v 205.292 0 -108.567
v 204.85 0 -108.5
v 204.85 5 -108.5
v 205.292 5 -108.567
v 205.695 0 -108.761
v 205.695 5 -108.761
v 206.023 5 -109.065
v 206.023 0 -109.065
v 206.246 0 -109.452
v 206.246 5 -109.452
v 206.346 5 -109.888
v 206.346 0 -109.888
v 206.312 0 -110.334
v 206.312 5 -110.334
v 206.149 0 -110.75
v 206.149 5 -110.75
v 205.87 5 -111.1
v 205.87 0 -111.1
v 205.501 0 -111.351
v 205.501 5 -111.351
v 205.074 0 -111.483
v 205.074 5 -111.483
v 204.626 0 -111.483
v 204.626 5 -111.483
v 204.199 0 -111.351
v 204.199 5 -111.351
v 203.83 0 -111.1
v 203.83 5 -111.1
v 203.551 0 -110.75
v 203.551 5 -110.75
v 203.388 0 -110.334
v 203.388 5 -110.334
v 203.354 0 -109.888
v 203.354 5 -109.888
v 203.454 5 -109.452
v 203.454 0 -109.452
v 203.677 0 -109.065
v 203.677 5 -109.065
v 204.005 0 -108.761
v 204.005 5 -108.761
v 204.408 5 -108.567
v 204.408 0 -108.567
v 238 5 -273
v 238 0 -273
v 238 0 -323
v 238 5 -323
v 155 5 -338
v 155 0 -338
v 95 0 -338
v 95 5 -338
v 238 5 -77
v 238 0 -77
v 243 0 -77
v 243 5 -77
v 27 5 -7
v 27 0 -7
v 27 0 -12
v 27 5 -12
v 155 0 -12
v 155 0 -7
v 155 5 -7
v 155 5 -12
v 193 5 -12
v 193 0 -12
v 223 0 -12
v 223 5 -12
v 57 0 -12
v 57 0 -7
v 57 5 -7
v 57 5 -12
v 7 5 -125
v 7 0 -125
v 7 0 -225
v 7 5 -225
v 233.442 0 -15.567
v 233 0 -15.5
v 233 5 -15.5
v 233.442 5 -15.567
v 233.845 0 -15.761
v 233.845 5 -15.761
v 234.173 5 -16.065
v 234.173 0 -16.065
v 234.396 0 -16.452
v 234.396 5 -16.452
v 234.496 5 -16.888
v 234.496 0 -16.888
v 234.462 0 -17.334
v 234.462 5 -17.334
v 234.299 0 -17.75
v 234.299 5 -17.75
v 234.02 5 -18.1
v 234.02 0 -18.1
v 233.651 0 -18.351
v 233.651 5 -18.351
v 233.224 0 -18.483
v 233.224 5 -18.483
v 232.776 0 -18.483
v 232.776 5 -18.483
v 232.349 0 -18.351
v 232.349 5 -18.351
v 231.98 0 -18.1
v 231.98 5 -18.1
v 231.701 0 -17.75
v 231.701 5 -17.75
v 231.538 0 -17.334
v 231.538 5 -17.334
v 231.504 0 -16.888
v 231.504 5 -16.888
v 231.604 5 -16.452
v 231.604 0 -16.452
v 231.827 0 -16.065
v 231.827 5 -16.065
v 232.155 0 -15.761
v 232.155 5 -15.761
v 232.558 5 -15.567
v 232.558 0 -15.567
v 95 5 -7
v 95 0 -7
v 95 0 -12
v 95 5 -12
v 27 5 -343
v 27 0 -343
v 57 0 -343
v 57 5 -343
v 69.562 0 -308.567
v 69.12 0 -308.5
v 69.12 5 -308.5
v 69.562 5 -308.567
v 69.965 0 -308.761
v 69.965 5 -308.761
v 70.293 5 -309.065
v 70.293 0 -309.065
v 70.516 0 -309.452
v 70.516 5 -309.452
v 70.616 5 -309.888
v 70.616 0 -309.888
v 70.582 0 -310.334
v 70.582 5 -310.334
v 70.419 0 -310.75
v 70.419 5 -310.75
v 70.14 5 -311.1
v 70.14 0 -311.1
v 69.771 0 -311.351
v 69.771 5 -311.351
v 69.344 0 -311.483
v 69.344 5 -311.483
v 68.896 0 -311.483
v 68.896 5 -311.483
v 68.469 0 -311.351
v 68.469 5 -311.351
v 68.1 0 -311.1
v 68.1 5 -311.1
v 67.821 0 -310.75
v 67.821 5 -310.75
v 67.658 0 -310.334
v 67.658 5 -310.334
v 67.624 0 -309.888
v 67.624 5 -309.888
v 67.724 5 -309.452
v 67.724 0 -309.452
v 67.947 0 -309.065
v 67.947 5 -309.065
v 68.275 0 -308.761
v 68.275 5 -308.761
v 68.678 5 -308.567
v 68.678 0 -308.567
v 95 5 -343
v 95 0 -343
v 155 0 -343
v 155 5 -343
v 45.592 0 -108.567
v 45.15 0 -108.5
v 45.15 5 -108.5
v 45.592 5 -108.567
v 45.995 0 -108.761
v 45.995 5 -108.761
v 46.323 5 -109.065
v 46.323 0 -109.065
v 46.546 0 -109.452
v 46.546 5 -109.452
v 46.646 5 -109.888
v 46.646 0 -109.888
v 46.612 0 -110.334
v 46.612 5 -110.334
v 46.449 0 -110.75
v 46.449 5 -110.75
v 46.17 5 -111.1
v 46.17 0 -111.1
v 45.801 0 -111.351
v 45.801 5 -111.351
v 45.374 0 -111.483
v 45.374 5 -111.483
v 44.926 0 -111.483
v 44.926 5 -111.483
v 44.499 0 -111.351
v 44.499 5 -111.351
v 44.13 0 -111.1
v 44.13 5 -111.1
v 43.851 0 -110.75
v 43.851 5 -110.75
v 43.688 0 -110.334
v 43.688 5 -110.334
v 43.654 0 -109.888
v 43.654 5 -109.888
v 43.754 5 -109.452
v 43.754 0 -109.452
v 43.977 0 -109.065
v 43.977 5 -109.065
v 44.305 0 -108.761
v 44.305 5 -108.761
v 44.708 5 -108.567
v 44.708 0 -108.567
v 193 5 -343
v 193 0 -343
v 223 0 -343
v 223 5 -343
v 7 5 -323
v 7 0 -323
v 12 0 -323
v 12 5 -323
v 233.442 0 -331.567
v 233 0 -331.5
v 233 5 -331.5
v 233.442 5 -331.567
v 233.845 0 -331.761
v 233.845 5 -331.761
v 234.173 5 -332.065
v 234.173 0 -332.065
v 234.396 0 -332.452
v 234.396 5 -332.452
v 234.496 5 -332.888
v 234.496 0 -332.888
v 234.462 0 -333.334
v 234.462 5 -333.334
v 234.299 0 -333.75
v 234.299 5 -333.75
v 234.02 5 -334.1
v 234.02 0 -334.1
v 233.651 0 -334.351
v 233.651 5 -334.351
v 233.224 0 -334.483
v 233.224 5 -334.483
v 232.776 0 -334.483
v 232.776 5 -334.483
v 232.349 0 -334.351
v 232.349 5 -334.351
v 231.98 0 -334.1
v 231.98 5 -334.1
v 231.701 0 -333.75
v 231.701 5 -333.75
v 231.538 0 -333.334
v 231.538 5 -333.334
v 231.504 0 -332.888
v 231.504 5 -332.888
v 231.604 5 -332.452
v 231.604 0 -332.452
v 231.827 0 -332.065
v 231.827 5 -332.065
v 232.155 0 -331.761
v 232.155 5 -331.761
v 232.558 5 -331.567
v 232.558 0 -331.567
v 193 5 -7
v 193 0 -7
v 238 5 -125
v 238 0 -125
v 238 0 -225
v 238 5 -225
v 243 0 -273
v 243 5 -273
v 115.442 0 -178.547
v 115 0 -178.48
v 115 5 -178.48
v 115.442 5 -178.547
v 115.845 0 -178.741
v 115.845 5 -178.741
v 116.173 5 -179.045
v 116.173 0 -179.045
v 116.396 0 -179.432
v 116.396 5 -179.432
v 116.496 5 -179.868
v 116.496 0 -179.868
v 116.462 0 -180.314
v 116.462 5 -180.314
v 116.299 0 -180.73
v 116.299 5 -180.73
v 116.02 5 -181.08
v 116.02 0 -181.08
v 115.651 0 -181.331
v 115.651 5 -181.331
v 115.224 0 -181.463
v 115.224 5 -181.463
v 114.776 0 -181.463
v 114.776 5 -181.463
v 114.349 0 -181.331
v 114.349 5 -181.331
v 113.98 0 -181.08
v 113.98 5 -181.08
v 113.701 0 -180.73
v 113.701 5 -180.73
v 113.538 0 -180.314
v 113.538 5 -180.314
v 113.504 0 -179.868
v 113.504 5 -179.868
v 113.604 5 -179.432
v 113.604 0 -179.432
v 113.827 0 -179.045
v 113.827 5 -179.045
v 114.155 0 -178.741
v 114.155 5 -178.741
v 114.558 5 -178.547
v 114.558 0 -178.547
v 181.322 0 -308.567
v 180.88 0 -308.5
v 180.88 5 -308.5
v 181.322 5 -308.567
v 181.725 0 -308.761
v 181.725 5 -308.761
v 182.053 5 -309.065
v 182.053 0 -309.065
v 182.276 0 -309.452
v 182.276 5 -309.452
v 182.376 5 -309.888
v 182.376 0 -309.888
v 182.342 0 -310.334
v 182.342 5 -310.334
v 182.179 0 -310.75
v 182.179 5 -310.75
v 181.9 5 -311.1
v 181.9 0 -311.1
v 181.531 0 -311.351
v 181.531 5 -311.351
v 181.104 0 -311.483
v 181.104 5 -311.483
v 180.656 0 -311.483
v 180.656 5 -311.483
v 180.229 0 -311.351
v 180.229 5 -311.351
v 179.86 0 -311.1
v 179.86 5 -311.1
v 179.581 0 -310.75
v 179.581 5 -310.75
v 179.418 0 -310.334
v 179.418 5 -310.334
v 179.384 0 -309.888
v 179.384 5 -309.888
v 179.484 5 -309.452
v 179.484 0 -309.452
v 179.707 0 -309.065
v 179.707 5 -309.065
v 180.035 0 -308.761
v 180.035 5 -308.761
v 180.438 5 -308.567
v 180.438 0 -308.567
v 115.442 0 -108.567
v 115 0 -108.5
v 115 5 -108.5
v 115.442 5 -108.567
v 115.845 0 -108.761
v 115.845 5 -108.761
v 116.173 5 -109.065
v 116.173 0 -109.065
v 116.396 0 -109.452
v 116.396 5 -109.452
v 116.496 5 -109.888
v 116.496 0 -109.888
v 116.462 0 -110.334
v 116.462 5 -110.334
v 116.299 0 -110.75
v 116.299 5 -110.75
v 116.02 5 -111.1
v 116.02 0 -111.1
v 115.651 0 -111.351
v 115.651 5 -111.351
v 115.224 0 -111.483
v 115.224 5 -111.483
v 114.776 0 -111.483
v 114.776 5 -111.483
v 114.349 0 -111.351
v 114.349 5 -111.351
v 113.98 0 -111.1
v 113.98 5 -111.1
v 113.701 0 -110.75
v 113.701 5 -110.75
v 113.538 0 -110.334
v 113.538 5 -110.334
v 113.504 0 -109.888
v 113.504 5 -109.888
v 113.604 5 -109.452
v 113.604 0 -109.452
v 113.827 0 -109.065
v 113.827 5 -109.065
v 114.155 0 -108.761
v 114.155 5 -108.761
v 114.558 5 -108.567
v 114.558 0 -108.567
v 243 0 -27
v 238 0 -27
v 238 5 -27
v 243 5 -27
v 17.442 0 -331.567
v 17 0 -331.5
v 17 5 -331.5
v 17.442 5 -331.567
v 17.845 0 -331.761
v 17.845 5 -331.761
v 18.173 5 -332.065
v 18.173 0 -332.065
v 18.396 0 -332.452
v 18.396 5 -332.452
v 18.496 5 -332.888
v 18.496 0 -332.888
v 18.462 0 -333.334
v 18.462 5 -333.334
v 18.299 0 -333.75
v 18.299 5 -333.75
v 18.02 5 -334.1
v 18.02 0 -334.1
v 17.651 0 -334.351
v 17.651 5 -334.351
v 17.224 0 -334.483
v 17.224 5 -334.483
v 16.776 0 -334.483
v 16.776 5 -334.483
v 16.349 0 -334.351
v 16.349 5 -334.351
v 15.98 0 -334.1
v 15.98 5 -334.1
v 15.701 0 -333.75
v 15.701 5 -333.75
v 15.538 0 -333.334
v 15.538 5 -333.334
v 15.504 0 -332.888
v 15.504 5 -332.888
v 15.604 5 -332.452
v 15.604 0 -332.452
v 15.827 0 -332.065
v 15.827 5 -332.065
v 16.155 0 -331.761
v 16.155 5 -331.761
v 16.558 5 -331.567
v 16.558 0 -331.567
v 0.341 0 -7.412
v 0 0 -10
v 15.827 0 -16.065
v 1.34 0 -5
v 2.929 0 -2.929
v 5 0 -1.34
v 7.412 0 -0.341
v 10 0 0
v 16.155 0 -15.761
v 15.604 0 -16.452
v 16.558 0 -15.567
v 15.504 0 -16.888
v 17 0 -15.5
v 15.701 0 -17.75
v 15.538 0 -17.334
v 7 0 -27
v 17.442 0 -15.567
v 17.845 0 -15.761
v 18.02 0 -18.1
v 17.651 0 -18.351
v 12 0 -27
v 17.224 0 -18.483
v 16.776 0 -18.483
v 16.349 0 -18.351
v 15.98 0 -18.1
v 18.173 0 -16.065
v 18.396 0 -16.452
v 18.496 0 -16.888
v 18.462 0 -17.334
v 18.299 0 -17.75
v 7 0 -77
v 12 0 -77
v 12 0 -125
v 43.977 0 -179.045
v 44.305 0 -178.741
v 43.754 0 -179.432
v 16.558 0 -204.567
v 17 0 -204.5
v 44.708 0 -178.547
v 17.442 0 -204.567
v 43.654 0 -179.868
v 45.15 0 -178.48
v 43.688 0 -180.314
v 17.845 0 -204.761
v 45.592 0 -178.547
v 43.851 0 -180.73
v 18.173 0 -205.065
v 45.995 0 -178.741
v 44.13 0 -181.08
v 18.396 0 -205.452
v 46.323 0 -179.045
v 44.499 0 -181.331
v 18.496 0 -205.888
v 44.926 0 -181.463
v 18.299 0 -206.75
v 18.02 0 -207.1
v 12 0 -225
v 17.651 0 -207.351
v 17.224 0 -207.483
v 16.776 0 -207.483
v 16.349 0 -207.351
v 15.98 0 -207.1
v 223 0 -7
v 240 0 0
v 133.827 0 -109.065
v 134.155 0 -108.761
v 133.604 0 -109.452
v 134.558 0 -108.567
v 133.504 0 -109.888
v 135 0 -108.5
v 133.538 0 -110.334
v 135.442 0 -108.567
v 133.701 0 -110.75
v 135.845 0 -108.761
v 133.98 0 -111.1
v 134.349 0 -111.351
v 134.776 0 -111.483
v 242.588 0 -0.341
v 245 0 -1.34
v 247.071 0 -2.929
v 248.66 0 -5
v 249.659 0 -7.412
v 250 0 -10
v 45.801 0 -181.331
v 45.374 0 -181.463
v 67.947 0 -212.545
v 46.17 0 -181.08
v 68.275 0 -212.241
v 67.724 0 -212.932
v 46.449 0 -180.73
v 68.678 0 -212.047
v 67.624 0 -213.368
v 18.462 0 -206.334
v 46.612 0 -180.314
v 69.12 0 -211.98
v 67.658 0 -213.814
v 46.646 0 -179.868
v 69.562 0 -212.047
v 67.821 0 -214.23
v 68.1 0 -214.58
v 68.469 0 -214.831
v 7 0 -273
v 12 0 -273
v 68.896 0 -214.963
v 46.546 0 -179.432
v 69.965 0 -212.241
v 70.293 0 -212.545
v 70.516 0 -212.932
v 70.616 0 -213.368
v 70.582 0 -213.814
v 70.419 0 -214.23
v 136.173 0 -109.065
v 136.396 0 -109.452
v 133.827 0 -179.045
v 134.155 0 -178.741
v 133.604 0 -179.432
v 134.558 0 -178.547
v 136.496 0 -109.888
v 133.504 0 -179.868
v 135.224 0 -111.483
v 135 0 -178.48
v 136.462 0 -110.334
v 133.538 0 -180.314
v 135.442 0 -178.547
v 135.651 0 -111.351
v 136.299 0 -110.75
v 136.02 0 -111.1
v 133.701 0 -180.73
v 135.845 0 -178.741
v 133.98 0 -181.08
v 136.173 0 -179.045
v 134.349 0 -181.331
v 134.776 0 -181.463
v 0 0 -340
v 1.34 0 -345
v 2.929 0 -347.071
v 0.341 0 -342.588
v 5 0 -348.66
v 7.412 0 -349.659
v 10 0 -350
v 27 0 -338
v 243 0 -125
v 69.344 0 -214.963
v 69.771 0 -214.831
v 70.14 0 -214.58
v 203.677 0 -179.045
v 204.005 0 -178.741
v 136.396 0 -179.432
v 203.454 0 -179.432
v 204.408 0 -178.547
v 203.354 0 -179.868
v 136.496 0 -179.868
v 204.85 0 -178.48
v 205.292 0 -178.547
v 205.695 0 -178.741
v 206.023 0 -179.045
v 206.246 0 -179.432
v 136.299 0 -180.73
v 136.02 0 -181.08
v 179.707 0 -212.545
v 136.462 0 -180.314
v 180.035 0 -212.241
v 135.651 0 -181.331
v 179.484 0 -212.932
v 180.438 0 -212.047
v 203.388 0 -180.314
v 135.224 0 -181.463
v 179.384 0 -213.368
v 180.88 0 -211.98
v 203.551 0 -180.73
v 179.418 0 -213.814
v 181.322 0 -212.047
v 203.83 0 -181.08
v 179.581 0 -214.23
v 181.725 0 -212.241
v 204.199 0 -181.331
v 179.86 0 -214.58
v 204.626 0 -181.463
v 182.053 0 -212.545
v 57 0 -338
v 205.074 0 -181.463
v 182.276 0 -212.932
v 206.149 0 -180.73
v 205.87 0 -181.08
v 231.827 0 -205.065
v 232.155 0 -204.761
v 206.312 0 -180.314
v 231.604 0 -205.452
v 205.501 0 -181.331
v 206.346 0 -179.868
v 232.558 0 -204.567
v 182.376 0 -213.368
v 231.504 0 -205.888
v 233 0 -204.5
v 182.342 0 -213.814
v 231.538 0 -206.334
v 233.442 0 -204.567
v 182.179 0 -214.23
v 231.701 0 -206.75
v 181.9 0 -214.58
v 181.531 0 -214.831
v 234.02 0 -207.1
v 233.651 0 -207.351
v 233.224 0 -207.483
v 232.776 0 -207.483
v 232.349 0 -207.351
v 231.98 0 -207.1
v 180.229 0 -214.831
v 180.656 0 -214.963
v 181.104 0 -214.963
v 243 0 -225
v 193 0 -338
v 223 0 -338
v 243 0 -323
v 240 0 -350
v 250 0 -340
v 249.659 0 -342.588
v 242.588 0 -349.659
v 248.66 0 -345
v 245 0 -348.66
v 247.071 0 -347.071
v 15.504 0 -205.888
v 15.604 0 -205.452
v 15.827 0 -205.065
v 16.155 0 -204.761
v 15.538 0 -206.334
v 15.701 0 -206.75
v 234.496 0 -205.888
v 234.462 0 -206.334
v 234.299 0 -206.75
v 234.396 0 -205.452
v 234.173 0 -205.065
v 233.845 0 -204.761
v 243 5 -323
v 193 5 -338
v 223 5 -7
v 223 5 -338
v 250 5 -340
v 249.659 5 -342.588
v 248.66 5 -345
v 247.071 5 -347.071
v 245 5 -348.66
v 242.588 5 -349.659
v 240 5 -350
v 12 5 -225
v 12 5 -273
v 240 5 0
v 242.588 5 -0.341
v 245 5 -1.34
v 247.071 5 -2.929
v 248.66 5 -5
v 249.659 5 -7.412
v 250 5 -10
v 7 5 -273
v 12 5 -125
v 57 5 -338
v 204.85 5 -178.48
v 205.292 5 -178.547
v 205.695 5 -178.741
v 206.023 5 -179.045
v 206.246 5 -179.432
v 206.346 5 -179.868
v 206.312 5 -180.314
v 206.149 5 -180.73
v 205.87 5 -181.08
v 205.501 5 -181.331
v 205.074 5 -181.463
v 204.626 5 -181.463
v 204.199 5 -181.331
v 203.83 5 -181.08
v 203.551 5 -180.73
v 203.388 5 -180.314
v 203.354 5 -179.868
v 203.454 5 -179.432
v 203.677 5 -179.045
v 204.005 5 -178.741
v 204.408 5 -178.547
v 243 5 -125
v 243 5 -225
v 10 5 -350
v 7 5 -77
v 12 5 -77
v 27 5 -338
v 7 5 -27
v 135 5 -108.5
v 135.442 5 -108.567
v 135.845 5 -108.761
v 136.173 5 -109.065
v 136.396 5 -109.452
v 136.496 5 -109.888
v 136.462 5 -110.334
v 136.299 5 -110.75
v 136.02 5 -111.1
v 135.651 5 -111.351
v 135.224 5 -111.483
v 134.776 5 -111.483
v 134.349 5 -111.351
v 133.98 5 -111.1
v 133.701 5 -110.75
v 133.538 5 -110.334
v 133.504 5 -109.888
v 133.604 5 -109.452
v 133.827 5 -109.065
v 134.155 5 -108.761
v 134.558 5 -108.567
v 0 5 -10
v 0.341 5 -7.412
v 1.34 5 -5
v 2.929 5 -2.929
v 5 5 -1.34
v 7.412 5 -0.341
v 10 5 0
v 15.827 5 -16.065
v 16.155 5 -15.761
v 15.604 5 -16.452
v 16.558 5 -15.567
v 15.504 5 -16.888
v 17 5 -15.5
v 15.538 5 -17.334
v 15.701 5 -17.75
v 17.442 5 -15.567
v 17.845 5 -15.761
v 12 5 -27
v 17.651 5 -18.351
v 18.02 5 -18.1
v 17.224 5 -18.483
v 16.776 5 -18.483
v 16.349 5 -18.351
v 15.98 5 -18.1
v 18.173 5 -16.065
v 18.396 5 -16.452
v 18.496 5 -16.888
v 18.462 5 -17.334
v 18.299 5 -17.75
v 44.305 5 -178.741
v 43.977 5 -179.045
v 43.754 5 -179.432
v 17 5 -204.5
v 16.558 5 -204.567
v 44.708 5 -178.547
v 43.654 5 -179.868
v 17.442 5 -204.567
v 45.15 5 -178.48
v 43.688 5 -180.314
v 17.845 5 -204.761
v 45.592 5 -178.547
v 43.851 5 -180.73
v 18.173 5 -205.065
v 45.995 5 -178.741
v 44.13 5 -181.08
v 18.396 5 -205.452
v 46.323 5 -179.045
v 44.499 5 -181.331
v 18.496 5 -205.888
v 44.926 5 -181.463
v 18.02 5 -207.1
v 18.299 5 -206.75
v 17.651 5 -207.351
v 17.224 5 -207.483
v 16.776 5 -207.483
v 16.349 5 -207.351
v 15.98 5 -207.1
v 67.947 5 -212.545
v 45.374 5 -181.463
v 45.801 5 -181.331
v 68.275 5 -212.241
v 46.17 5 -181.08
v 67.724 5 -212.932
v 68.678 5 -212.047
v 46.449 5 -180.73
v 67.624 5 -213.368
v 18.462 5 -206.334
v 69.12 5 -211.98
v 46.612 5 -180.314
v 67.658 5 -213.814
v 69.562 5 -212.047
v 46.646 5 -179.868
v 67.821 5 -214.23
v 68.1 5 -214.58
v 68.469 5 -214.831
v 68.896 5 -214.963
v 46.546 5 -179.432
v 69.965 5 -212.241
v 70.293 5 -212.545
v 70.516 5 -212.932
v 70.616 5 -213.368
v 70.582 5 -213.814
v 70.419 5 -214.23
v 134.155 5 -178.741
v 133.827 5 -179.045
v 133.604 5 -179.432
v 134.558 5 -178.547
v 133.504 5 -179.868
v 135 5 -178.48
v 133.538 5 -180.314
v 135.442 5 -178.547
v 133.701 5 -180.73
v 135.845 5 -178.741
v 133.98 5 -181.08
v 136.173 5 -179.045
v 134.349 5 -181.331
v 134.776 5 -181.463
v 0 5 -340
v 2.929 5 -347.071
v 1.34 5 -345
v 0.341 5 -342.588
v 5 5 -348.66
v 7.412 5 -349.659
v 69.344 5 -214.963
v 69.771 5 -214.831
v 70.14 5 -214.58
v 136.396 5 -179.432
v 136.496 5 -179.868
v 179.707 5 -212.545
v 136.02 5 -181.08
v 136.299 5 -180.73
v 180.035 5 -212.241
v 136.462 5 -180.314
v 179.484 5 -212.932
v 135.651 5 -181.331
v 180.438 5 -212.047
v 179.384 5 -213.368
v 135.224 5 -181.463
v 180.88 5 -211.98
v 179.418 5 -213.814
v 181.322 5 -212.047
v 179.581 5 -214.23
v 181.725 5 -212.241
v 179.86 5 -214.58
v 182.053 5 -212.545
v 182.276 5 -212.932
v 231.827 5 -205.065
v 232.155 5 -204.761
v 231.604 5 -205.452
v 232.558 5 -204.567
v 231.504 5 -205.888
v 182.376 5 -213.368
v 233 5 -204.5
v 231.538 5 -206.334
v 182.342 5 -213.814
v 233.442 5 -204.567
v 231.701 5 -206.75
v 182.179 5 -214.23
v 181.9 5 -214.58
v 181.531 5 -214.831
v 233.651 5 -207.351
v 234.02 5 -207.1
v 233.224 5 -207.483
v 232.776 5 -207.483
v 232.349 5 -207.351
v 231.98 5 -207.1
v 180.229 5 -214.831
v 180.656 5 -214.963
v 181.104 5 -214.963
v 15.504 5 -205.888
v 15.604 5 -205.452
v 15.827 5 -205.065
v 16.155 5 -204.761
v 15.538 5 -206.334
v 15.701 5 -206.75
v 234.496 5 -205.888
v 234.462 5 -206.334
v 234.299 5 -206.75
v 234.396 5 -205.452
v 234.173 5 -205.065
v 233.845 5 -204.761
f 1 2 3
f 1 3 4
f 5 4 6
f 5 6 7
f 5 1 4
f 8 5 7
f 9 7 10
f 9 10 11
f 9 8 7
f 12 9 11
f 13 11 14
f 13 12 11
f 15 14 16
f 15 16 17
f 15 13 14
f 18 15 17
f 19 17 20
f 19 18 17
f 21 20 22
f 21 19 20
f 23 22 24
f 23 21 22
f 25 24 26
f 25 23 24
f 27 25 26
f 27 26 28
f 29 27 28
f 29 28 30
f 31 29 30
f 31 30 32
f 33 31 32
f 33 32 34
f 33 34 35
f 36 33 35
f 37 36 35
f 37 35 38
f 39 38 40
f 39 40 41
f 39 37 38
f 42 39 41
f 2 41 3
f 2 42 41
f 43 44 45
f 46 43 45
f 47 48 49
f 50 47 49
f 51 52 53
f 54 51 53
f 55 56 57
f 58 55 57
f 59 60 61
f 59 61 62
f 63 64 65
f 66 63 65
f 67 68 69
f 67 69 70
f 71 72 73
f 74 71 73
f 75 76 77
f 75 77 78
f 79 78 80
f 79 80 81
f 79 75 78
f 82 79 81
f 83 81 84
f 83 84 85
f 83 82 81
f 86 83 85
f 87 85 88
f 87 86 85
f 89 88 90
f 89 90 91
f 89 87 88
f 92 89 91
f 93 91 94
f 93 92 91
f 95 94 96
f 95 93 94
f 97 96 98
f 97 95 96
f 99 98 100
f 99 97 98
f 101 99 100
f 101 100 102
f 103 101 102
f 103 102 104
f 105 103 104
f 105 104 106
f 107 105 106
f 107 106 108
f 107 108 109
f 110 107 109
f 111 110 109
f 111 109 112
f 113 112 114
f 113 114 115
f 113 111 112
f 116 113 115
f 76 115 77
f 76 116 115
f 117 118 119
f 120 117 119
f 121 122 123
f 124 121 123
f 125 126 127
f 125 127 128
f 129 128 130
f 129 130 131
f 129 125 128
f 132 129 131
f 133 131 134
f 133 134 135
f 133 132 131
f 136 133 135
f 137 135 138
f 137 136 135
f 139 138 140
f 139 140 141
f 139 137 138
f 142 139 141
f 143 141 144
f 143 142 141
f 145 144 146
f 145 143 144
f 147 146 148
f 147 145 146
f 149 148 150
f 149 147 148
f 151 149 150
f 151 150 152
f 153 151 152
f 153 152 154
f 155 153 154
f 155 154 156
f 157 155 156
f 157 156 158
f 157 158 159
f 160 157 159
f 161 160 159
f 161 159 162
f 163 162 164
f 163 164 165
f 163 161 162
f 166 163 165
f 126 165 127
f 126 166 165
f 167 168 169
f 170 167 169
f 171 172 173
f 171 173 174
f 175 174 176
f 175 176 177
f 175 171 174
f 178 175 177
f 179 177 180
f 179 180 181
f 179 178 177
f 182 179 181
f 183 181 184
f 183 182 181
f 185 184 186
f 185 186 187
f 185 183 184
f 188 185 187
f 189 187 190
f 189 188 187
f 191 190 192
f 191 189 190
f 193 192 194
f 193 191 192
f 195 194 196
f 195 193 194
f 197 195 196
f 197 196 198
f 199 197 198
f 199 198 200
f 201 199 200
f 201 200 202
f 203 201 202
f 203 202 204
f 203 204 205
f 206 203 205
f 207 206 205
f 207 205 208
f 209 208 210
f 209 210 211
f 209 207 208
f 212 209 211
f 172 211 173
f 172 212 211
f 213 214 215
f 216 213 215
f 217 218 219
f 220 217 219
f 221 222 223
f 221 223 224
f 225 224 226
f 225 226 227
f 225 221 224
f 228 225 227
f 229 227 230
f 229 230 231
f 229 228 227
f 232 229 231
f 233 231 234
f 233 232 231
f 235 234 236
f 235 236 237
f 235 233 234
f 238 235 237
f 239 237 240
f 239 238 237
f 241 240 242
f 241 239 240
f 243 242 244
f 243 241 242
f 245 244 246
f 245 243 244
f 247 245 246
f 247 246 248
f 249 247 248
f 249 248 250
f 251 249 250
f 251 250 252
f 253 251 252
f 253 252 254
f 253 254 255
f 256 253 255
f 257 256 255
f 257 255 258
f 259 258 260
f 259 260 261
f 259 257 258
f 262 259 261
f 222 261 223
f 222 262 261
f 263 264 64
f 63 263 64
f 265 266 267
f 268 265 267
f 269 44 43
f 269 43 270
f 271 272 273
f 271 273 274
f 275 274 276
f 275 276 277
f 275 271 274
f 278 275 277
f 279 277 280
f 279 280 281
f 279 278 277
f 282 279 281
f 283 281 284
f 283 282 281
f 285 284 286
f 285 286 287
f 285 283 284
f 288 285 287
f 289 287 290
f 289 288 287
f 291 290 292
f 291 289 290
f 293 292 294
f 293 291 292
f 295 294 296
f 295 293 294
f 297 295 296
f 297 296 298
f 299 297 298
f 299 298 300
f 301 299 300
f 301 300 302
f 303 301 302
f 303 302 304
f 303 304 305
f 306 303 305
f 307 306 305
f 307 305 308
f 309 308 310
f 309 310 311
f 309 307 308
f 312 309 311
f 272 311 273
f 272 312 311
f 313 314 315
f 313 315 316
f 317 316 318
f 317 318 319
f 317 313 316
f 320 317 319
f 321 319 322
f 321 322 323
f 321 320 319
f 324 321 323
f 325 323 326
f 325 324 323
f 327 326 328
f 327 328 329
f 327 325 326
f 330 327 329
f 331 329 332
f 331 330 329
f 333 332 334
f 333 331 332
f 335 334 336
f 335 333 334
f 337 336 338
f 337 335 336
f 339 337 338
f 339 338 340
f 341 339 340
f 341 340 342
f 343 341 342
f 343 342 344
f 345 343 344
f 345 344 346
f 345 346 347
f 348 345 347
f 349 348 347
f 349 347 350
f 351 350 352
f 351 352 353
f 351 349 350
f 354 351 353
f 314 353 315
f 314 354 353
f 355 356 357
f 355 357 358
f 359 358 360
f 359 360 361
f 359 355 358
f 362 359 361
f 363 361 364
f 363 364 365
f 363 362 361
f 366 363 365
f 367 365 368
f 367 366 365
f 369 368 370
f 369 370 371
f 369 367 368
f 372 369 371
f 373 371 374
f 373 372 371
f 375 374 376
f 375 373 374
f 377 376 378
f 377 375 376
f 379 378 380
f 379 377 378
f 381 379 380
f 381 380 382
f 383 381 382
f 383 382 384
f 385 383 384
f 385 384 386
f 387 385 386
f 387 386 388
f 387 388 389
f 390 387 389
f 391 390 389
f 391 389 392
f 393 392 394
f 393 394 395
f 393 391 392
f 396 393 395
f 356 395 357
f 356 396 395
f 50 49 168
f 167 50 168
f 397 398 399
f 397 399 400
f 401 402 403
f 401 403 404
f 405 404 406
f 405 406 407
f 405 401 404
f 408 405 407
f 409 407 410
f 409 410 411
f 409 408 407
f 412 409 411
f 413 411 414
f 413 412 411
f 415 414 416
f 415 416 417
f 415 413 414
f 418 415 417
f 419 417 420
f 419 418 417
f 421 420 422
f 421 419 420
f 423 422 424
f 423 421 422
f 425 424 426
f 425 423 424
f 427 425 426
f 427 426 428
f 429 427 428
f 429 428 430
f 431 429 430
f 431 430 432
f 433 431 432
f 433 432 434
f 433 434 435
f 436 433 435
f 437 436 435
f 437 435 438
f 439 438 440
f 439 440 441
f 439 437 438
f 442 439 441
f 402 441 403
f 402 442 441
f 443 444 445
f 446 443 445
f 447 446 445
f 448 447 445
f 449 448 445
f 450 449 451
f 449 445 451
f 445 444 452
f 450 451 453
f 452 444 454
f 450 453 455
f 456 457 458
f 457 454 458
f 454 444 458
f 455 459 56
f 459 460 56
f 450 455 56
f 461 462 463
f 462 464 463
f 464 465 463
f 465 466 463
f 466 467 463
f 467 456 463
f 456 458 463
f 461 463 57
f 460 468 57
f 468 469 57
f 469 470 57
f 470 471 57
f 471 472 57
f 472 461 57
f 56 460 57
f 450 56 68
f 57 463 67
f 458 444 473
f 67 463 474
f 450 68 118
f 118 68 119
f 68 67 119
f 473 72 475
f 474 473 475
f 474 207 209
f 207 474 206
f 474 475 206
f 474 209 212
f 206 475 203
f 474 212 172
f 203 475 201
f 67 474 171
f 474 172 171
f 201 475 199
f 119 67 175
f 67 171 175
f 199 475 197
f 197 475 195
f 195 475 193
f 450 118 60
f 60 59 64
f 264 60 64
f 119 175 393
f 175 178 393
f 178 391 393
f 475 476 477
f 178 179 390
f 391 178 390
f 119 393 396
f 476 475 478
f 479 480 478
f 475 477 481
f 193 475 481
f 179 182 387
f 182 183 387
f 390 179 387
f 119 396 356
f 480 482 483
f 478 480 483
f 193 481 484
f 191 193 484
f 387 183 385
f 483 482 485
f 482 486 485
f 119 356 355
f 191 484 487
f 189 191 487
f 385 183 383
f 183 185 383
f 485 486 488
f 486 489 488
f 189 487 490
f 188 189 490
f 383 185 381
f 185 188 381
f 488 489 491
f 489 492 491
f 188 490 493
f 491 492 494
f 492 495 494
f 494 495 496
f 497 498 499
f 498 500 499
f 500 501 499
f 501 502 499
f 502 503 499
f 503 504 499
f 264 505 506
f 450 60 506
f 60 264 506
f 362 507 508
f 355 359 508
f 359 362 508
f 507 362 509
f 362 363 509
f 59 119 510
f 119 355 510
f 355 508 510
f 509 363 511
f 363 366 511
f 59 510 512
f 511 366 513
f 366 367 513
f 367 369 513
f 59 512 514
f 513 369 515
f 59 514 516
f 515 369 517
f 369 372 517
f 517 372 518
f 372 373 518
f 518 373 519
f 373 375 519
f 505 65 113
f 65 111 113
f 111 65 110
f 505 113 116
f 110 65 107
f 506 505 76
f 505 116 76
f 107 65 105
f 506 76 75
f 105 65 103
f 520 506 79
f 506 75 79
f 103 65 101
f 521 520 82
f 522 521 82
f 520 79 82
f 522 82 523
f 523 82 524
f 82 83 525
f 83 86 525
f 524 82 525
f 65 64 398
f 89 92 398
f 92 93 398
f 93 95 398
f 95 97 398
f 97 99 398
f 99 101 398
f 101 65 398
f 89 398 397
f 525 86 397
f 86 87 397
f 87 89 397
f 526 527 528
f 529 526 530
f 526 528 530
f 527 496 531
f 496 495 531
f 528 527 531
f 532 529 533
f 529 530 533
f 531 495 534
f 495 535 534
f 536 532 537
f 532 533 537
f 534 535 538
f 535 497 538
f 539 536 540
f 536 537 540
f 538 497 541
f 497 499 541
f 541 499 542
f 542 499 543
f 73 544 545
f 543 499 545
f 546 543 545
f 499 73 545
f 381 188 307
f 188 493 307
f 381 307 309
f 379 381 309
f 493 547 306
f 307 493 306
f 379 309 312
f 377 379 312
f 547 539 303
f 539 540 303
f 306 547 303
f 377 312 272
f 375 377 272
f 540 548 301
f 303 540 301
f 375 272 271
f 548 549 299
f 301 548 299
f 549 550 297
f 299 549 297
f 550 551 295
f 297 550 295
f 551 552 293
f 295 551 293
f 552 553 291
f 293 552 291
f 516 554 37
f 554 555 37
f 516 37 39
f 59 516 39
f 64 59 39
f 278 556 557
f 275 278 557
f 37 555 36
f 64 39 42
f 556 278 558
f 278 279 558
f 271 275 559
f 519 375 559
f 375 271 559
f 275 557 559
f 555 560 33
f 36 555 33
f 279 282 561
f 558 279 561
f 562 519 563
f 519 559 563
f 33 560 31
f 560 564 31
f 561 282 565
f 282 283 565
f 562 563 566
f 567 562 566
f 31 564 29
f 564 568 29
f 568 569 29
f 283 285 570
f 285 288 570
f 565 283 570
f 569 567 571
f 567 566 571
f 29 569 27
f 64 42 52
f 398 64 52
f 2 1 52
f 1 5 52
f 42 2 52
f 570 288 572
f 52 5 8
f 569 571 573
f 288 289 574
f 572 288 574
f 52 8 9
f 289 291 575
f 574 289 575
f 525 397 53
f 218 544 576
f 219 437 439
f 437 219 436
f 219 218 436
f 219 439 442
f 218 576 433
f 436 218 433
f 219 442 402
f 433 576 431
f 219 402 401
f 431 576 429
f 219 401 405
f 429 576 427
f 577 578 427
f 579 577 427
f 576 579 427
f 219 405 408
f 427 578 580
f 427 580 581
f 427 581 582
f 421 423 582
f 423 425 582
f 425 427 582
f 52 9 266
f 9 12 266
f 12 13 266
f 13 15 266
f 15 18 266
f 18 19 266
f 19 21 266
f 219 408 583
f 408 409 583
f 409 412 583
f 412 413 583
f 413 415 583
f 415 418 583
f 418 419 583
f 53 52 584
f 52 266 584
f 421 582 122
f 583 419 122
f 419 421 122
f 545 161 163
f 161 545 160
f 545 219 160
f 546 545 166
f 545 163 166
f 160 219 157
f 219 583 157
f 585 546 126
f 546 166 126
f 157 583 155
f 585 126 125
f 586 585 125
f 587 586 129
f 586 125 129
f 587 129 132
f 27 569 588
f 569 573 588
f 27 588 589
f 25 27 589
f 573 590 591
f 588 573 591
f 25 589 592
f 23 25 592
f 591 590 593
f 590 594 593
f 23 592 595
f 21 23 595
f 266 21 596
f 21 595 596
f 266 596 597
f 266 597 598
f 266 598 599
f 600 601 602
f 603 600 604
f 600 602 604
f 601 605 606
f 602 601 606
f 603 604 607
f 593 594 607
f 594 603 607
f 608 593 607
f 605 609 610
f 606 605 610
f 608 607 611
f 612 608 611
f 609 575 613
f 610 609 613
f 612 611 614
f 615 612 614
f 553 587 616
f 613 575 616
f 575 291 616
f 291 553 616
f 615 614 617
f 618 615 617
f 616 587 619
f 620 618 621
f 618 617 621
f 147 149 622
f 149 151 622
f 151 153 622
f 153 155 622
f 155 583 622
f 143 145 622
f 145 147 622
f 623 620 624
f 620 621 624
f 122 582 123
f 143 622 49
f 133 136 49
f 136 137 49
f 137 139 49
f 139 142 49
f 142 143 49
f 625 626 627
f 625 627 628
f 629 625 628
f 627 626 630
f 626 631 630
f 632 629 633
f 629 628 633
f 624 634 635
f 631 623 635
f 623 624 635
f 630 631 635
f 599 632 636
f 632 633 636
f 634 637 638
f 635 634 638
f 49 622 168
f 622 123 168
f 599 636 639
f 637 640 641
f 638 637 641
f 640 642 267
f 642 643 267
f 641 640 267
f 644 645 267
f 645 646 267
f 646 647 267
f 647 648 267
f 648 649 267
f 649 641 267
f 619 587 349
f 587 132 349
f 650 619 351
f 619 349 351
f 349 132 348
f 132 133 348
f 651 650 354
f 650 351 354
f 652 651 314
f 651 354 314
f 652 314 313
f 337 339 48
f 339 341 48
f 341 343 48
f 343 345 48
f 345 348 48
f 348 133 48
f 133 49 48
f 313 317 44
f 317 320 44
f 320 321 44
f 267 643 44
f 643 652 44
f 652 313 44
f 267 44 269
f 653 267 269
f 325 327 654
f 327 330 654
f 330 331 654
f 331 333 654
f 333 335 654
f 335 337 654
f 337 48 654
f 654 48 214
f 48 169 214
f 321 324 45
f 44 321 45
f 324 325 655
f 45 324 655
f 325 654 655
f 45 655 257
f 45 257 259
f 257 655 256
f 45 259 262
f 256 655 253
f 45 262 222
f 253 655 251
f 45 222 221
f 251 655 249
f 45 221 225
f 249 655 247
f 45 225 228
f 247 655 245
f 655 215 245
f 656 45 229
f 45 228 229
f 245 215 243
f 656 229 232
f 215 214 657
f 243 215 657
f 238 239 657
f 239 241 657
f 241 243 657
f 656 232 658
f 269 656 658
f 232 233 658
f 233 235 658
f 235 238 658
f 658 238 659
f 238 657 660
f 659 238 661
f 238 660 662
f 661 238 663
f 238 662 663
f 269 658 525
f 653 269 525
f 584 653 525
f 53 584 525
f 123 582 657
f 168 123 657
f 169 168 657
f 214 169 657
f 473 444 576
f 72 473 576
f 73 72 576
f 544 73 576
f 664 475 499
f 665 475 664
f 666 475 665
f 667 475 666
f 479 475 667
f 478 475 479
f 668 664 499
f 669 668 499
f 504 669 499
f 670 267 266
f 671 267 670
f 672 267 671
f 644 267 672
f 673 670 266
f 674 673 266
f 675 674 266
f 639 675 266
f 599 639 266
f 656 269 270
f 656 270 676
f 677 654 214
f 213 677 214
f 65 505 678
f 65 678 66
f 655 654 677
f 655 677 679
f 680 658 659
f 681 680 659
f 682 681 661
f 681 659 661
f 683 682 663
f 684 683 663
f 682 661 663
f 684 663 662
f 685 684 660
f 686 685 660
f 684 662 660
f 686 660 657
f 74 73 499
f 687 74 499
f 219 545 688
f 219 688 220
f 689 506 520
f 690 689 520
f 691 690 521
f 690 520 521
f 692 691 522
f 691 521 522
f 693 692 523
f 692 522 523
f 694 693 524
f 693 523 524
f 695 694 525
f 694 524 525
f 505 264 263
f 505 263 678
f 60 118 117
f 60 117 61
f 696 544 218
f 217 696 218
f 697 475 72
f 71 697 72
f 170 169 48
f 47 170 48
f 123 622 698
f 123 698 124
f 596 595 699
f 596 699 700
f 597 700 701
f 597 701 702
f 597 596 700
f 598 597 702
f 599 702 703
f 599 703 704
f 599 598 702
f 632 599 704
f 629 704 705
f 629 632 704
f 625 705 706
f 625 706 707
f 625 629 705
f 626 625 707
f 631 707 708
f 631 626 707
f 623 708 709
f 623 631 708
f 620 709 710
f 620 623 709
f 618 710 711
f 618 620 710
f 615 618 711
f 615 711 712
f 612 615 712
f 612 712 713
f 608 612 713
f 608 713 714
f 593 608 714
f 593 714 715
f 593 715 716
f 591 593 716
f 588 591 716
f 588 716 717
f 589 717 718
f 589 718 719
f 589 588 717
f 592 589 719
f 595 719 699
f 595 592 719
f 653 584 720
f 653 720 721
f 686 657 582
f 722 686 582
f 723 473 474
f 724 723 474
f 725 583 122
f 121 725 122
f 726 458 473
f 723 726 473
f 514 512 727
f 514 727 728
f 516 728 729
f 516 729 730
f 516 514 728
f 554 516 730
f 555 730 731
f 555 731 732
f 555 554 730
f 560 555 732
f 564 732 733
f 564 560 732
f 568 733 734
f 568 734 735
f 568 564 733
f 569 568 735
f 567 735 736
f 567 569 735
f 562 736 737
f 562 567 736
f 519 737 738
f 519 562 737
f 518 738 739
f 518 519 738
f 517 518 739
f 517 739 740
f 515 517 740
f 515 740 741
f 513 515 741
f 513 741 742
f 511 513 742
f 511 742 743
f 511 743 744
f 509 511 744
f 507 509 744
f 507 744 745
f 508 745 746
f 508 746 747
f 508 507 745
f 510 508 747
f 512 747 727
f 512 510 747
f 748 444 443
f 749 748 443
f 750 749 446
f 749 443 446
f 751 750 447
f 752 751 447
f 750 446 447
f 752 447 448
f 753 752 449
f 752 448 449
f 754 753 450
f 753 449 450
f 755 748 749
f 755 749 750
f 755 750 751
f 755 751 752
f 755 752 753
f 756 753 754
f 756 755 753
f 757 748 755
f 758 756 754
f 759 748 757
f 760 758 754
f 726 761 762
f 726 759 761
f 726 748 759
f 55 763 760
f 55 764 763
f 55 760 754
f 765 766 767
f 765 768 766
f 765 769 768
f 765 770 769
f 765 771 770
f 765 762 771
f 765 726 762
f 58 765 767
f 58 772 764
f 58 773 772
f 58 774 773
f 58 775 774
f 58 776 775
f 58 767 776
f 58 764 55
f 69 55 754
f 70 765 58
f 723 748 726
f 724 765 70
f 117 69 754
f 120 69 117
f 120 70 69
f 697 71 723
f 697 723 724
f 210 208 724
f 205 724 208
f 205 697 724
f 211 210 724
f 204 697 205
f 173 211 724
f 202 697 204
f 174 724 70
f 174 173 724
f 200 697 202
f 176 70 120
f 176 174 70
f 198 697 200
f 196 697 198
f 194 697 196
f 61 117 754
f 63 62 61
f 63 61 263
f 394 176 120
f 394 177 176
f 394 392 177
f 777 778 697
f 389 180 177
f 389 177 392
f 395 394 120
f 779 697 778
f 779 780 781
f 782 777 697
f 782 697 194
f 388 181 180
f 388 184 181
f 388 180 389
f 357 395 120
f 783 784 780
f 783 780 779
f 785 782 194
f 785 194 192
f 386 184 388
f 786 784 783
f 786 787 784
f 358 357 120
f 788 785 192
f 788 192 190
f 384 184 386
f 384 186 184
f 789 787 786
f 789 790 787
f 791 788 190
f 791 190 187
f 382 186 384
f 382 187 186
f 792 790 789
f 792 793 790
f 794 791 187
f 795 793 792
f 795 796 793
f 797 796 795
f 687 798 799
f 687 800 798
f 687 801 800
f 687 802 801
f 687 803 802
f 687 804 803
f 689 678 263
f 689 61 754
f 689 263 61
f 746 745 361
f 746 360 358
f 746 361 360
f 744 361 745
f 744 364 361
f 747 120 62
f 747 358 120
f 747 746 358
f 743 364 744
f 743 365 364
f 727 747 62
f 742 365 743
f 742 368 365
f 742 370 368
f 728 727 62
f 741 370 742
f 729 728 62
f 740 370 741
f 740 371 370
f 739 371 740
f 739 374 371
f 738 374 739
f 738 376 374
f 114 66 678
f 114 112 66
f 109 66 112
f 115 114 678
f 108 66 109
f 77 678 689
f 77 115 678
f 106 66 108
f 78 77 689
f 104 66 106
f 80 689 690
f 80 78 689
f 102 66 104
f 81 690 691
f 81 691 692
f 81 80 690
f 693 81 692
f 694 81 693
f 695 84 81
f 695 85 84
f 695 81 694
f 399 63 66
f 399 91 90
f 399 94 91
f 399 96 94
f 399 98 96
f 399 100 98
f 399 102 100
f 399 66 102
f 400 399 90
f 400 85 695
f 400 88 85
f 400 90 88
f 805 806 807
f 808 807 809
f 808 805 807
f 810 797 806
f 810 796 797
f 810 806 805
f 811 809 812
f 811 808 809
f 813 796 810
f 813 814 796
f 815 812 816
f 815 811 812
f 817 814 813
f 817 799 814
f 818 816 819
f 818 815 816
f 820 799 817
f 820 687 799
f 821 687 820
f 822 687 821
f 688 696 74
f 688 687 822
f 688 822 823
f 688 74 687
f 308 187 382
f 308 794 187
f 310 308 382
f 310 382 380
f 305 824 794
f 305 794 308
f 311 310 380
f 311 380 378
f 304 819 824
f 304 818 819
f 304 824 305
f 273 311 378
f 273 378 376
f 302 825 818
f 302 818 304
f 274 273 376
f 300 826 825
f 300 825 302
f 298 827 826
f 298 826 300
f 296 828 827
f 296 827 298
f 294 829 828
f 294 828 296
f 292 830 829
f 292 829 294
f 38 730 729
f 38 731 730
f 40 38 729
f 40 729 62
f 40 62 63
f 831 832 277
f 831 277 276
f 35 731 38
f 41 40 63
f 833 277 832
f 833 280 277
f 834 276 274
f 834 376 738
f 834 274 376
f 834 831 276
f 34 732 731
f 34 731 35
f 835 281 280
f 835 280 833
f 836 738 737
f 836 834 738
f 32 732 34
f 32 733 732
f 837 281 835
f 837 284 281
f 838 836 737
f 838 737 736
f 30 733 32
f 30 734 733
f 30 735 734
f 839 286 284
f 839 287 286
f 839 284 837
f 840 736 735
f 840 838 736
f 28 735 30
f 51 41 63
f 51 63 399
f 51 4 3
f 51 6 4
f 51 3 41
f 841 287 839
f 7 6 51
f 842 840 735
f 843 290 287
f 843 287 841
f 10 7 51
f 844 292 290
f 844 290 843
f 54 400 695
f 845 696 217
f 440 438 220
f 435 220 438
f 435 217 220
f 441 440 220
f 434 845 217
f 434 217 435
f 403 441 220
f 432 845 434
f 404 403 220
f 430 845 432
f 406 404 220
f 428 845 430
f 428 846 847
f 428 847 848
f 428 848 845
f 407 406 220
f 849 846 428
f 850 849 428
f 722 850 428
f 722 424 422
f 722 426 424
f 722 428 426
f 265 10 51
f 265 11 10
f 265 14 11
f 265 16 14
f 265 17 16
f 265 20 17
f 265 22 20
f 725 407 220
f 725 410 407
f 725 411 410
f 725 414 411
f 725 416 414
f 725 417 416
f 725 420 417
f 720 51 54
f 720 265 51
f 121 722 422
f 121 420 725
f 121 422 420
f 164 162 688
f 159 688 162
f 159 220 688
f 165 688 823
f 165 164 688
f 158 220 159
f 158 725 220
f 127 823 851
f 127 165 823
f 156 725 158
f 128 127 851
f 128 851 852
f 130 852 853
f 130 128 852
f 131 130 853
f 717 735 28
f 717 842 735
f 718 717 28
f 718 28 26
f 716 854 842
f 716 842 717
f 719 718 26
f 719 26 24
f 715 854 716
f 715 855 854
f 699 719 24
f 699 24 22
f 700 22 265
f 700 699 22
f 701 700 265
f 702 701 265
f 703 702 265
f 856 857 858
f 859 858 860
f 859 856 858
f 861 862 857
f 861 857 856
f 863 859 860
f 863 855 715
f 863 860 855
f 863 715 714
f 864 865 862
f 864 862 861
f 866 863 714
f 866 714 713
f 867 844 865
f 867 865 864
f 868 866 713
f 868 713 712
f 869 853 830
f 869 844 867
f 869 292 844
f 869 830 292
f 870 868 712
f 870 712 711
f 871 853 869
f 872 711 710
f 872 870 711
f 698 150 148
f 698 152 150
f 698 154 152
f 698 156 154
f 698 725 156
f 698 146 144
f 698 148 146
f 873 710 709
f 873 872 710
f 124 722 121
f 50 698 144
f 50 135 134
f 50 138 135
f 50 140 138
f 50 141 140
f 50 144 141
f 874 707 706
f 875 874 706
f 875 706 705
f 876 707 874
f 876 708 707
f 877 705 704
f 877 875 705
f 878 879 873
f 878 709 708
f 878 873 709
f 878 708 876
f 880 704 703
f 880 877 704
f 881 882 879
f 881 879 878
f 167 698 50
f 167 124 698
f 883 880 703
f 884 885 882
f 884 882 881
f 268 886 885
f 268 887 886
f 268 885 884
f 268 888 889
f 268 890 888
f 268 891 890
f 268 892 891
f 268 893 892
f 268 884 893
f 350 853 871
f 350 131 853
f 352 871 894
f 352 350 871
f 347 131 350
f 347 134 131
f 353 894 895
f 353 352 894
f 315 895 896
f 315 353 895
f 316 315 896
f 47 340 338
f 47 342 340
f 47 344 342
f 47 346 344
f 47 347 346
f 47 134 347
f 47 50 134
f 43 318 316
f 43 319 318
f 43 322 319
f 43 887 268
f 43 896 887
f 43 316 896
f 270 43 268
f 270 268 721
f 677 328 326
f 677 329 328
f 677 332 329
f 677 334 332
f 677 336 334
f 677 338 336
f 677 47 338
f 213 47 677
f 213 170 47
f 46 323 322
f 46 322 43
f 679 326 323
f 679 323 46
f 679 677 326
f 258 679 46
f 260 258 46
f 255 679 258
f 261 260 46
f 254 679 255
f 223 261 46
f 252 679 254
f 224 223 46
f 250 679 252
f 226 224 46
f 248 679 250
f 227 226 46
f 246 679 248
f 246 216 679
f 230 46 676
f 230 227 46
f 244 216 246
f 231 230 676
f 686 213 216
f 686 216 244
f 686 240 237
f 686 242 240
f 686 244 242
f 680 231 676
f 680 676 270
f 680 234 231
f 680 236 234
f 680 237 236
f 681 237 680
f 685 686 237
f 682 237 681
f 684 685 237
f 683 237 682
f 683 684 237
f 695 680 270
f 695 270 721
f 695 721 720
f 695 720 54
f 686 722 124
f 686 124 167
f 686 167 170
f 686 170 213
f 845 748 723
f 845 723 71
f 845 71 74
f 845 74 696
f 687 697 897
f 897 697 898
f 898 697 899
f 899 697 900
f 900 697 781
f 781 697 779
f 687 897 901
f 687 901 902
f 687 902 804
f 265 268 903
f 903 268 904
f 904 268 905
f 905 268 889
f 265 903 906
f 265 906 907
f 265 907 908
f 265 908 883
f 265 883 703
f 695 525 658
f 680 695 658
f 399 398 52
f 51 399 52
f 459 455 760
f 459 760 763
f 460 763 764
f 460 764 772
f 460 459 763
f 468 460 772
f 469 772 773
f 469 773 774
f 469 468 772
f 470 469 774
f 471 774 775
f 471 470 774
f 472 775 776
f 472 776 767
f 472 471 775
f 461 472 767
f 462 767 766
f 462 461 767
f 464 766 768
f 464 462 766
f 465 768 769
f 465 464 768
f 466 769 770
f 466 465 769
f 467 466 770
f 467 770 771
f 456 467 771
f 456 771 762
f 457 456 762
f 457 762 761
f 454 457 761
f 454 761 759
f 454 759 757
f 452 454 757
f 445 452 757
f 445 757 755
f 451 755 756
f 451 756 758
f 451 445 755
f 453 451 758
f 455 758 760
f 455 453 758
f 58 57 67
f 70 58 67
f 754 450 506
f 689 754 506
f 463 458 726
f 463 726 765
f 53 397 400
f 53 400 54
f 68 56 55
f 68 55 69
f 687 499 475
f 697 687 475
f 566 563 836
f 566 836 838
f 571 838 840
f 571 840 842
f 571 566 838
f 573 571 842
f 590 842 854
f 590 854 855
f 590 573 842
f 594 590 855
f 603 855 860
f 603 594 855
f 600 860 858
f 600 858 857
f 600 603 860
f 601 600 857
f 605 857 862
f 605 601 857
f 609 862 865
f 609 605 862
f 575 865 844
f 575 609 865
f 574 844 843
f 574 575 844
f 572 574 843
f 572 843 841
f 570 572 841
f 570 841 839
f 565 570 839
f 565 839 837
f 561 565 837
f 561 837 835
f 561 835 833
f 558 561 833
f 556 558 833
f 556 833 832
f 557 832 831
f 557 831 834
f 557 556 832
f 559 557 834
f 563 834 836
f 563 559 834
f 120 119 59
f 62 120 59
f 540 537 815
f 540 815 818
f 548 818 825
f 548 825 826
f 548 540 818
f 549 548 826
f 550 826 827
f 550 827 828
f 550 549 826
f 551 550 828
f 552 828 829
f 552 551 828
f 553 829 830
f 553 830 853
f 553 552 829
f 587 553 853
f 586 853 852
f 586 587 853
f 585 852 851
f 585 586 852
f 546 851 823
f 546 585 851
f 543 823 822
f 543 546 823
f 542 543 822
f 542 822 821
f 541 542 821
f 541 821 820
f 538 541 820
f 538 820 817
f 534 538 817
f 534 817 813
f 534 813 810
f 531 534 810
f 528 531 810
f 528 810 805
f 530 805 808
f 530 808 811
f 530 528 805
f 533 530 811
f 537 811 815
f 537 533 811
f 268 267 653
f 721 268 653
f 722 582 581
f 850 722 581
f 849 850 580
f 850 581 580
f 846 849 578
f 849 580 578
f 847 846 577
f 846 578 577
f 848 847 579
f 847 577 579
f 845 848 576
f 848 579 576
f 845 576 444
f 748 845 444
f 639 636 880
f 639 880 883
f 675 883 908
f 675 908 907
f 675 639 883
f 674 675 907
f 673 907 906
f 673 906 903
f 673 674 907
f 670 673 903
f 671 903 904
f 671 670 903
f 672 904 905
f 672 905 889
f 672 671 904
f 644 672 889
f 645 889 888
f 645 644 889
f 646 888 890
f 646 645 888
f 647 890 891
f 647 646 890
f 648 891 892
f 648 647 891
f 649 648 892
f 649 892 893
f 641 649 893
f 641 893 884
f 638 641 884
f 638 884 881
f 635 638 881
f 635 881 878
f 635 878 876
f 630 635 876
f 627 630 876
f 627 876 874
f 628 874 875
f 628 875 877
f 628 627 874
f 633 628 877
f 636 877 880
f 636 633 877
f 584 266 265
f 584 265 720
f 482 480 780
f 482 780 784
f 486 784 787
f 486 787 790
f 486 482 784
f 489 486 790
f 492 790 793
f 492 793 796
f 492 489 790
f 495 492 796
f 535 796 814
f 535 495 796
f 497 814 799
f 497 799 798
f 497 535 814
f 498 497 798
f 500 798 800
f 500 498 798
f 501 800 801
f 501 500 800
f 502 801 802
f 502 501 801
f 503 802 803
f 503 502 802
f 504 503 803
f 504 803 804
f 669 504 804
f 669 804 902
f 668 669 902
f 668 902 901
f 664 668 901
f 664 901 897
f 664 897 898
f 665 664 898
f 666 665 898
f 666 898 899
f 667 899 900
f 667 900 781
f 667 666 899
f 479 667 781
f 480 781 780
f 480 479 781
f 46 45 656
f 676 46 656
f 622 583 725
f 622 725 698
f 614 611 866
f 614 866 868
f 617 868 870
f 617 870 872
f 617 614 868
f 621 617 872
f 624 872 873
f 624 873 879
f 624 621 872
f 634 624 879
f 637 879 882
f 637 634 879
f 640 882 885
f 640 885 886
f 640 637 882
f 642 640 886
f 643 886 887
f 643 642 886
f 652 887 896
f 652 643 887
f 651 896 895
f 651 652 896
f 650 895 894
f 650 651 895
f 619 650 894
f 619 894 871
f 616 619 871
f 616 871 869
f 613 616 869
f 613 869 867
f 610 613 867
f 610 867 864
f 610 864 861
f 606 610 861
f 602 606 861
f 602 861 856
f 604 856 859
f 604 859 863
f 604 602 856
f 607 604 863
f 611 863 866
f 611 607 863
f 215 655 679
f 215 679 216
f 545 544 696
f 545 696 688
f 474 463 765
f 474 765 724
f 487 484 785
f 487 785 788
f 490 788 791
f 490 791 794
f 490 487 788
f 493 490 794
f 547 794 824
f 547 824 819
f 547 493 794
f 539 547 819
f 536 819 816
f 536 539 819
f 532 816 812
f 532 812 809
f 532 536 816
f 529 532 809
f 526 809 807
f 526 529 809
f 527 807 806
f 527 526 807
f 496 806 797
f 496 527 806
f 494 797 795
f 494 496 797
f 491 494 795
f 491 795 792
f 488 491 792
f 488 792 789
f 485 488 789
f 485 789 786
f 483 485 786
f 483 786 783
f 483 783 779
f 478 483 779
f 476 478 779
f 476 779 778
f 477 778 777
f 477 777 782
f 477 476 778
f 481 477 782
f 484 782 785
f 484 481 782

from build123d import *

# Parameters (mm, degrees)
SKETCH1_R           = 1.5
SKETCH1_W           = 30
SKETCH1_H           = 5
SKETCH1_W_2         = 5
SKETCH1_H_2         = 50
SKETCH1_W_3         = 60
SKETCH1_H_3         = 100
BOSS_EXTRUDE1_DEPTH = 5


with BuildPart() as part:
    # Sketch1 → Boss-Extrude1 (new body)
    # profile 1 of 2: a face of its own
    with BuildSketch(Plane(origin=(0, 0, 0), x_dir=(1, 0, 0), z_dir=(0, 1, 0))):
        with BuildLine():
            ThreePointArc((0, 10), (2.928932188, 2.928932188), (10, 0))
            Line((10, 0), (240, 0))
            ThreePointArc((240, 0), (247.071067812, 2.928932188), (250, 10))
            Line((250, 10), (250, 340))
            ThreePointArc((250, 340), (247.071067812, 347.071067812), (240, 350))
            Line((240, 350), (10, 350))
            ThreePointArc((10, 350), (2.928932188, 347.071067812), (0, 340))
            Line((0, 340), (0, 10))
        make_face()
        with Locations(Location((17, 17, 0), (0, 0, 270))):
            Circle(SKETCH1_R, mode=Mode.SUBTRACT)
        with Locations((42, 9.5)):
            Rectangle(SKETCH1_W, SKETCH1_H, mode=Mode.SUBTRACT)
        with Locations((9.5, 52)):
            Rectangle(SKETCH1_W_2, SKETCH1_H_2, mode=Mode.SUBTRACT)
        with Locations(Location((45.15, 110, 0), (0, 0, 270))):
            Circle(SKETCH1_R, mode=Mode.SUBTRACT)
        with Locations(Location((115, 110, 0), (0, 0, 270))):
            Circle(SKETCH1_R, mode=Mode.SUBTRACT)
        with Locations((125, 9.5)):
            Rectangle(SKETCH1_W_3, SKETCH1_H, mode=Mode.SUBTRACT)
        with Locations((208, 9.5)):
            Rectangle(SKETCH1_W, SKETCH1_H, mode=Mode.SUBTRACT)
        with Locations(Location((233, 17, 0), (0, 0, 270))):
            Circle(SKETCH1_R, mode=Mode.SUBTRACT)
        with Locations((240.5, 52)):
            Rectangle(SKETCH1_W_2, SKETCH1_H_2, mode=Mode.SUBTRACT)
        with Locations(Location((135, 110, 0), (0, 0, 270))):
            Circle(SKETCH1_R, mode=Mode.SUBTRACT)
        with Locations(Location((204.85, 110, 0), (0, 0, 270))):
            Circle(SKETCH1_R, mode=Mode.SUBTRACT)
        Polygon((7, 175), (7, 225), (12, 225), (12, 125), (7, 125), align=None, mode=Mode.SUBTRACT)
        with Locations(Location((17, 206, 0), (0, 0, 270))):
            Circle(SKETCH1_R, mode=Mode.SUBTRACT)
        with Locations(Location((45.15, 179.98, 0), (0, 0, 270))):
            Circle(SKETCH1_R, mode=Mode.SUBTRACT)
        with Locations(Location((69.12, 213.48, 0), (0, 0, 270))):
            Circle(SKETCH1_R, mode=Mode.SUBTRACT)
        with Locations(Location((115, 179.98, 0), (0, 0, 270))):
            Circle(SKETCH1_R, mode=Mode.SUBTRACT)
        with Locations((9.5, 298)):
            Rectangle(SKETCH1_W_2, SKETCH1_H_2, mode=Mode.SUBTRACT)
        with Locations(Location((17, 333, 0), (0, 0, 270))):
            Circle(SKETCH1_R, mode=Mode.SUBTRACT)
        with Locations((42, 340.5)):
            Rectangle(SKETCH1_W, SKETCH1_H, mode=Mode.SUBTRACT)
        with Locations(Location((69.12, 310, 0), (0, 0, 270))):
            Circle(SKETCH1_R, mode=Mode.SUBTRACT)
        with Locations(Location((135, 179.98, 0), (0, 0, 270))):
            Circle(SKETCH1_R, mode=Mode.SUBTRACT)
        with Locations(Location((180.88, 213.48, 0), (0, 0, 270))):
            Circle(SKETCH1_R, mode=Mode.SUBTRACT)
        with Locations(Location((204.85, 179.98, 0), (0, 0, 270))):
            Circle(SKETCH1_R, mode=Mode.SUBTRACT)
        with Locations((240.5, 175)):
            Rectangle(SKETCH1_W_2, SKETCH1_H_3, mode=Mode.SUBTRACT)
        with Locations(Location((233, 206, 0), (0, 0, 270))):
            Circle(SKETCH1_R, mode=Mode.SUBTRACT)
        Polygon((95, 343), (125, 343), (155, 343), (155, 338), (95, 338), align=None, mode=Mode.SUBTRACT)
        with Locations(Location((180.88, 310, 0), (0, 0, 270))):
            Circle(SKETCH1_R, mode=Mode.SUBTRACT)
        with Locations((240.5, 298)):
            Rectangle(SKETCH1_W_2, SKETCH1_H_2, mode=Mode.SUBTRACT)
        with Locations((208, 340.5)):
            Rectangle(SKETCH1_W, SKETCH1_H, mode=Mode.SUBTRACT)
        with Locations(Location((233, 333, 0), (0, 0, 270))):
            Circle(SKETCH1_R, mode=Mode.SUBTRACT)
    # profile 2 of 2: a face of its own
    with BuildSketch(Plane(origin=(0, 0, 0), x_dir=(1, 0, 0), z_dir=(0, 1, 0))):
        with BuildLine():
            ThreePointArc((0, 10), (2.928932188, 2.928932188), (10, 0))
            Line((10, 0), (240, 0))
            ThreePointArc((240, 0), (247.071067812, 2.928932188), (250, 10))
            Line((250, 10), (250, 340))
            ThreePointArc((250, 340), (247.071067812, 347.071067812), (240, 350))
            Line((240, 350), (10, 350))
            ThreePointArc((10, 350), (2.928932188, 347.071067812), (0, 340))
            Line((0, 340), (0, 10))
        make_face()
        with Locations(Location((17, 17, 0), (0, 0, 270))):
            Circle(SKETCH1_R, mode=Mode.SUBTRACT)
        with Locations((42, 9.5)):
            Rectangle(SKETCH1_W, SKETCH1_H, mode=Mode.SUBTRACT)
        with Locations((9.5, 52)):
            Rectangle(SKETCH1_W_2, SKETCH1_H_2, mode=Mode.SUBTRACT)
        with Locations(Location((45.15, 110, 0), (0, 0, 270))):
            Circle(SKETCH1_R, mode=Mode.SUBTRACT)
        with Locations(Location((115, 110, 0), (0, 0, 270))):
            Circle(SKETCH1_R, mode=Mode.SUBTRACT)
        with Locations((125, 9.5)):
            Rectangle(SKETCH1_W_3, SKETCH1_H, mode=Mode.SUBTRACT)
        with Locations((208, 9.5)):
            Rectangle(SKETCH1_W, SKETCH1_H, mode=Mode.SUBTRACT)
        with Locations(Location((233, 17, 0), (0, 0, 270))):
            Circle(SKETCH1_R, mode=Mode.SUBTRACT)
        with Locations((240.5, 52)):
            Rectangle(SKETCH1_W_2, SKETCH1_H_2, mode=Mode.SUBTRACT)
        with Locations(Location((135, 110, 0), (0, 0, 270))):
            Circle(SKETCH1_R, mode=Mode.SUBTRACT)
        with Locations(Location((204.85, 110, 0), (0, 0, 270))):
            Circle(SKETCH1_R, mode=Mode.SUBTRACT)
        Polygon((7, 175), (7, 225), (12, 225), (12, 125), (7, 125), align=None, mode=Mode.SUBTRACT)
        with Locations(Location((17, 206, 0), (0, 0, 270))):
            Circle(SKETCH1_R, mode=Mode.SUBTRACT)
        with Locations(Location((45.15, 179.98, 0), (0, 0, 270))):
            Circle(SKETCH1_R, mode=Mode.SUBTRACT)
        with Locations(Location((69.12, 213.48, 0), (0, 0, 270))):
            Circle(SKETCH1_R, mode=Mode.SUBTRACT)
        with Locations(Location((115, 179.98, 0), (0, 0, 270))):
            Circle(SKETCH1_R, mode=Mode.SUBTRACT)
        with Locations((9.5, 298)):
            Rectangle(SKETCH1_W_2, SKETCH1_H_2, mode=Mode.SUBTRACT)
        with Locations(Location((17, 333, 0), (0, 0, 270))):
            Circle(SKETCH1_R, mode=Mode.SUBTRACT)
        with Locations((42, 340.5)):
            Rectangle(SKETCH1_W, SKETCH1_H, mode=Mode.SUBTRACT)
        with Locations(Location((69.12, 310, 0), (0, 0, 270))):
            Circle(SKETCH1_R, mode=Mode.SUBTRACT)
        with Locations(Location((135, 179.98, 0), (0, 0, 270))):
            Circle(SKETCH1_R, mode=Mode.SUBTRACT)
        with Locations(Location((180.88, 213.48, 0), (0, 0, 270))):
            Circle(SKETCH1_R, mode=Mode.SUBTRACT)
        with Locations(Location((204.85, 179.98, 0), (0, 0, 270))):
            Circle(SKETCH1_R, mode=Mode.SUBTRACT)
        with Locations((240.5, 175)):
            Rectangle(SKETCH1_W_2, SKETCH1_H_3, mode=Mode.SUBTRACT)
        with Locations(Location((233, 206, 0), (0, 0, 270))):
            Circle(SKETCH1_R, mode=Mode.SUBTRACT)
        Polygon((95, 343), (125, 343), (155, 343), (155, 338), (95, 338), align=None, mode=Mode.SUBTRACT)
        with Locations(Location((180.88, 310, 0), (0, 0, 270))):
            Circle(SKETCH1_R, mode=Mode.SUBTRACT)
        with Locations((240.5, 298)):
            Rectangle(SKETCH1_W_2, SKETCH1_H_2, mode=Mode.SUBTRACT)
        with Locations((208, 340.5)):
            Rectangle(SKETCH1_W, SKETCH1_H, mode=Mode.SUBTRACT)
        with Locations(Location((233, 333, 0), (0, 0, 270))):
            Circle(SKETCH1_R, mode=Mode.SUBTRACT)
    extrude(amount=BOSS_EXTRUDE1_DEPTH)


solid = part.part
